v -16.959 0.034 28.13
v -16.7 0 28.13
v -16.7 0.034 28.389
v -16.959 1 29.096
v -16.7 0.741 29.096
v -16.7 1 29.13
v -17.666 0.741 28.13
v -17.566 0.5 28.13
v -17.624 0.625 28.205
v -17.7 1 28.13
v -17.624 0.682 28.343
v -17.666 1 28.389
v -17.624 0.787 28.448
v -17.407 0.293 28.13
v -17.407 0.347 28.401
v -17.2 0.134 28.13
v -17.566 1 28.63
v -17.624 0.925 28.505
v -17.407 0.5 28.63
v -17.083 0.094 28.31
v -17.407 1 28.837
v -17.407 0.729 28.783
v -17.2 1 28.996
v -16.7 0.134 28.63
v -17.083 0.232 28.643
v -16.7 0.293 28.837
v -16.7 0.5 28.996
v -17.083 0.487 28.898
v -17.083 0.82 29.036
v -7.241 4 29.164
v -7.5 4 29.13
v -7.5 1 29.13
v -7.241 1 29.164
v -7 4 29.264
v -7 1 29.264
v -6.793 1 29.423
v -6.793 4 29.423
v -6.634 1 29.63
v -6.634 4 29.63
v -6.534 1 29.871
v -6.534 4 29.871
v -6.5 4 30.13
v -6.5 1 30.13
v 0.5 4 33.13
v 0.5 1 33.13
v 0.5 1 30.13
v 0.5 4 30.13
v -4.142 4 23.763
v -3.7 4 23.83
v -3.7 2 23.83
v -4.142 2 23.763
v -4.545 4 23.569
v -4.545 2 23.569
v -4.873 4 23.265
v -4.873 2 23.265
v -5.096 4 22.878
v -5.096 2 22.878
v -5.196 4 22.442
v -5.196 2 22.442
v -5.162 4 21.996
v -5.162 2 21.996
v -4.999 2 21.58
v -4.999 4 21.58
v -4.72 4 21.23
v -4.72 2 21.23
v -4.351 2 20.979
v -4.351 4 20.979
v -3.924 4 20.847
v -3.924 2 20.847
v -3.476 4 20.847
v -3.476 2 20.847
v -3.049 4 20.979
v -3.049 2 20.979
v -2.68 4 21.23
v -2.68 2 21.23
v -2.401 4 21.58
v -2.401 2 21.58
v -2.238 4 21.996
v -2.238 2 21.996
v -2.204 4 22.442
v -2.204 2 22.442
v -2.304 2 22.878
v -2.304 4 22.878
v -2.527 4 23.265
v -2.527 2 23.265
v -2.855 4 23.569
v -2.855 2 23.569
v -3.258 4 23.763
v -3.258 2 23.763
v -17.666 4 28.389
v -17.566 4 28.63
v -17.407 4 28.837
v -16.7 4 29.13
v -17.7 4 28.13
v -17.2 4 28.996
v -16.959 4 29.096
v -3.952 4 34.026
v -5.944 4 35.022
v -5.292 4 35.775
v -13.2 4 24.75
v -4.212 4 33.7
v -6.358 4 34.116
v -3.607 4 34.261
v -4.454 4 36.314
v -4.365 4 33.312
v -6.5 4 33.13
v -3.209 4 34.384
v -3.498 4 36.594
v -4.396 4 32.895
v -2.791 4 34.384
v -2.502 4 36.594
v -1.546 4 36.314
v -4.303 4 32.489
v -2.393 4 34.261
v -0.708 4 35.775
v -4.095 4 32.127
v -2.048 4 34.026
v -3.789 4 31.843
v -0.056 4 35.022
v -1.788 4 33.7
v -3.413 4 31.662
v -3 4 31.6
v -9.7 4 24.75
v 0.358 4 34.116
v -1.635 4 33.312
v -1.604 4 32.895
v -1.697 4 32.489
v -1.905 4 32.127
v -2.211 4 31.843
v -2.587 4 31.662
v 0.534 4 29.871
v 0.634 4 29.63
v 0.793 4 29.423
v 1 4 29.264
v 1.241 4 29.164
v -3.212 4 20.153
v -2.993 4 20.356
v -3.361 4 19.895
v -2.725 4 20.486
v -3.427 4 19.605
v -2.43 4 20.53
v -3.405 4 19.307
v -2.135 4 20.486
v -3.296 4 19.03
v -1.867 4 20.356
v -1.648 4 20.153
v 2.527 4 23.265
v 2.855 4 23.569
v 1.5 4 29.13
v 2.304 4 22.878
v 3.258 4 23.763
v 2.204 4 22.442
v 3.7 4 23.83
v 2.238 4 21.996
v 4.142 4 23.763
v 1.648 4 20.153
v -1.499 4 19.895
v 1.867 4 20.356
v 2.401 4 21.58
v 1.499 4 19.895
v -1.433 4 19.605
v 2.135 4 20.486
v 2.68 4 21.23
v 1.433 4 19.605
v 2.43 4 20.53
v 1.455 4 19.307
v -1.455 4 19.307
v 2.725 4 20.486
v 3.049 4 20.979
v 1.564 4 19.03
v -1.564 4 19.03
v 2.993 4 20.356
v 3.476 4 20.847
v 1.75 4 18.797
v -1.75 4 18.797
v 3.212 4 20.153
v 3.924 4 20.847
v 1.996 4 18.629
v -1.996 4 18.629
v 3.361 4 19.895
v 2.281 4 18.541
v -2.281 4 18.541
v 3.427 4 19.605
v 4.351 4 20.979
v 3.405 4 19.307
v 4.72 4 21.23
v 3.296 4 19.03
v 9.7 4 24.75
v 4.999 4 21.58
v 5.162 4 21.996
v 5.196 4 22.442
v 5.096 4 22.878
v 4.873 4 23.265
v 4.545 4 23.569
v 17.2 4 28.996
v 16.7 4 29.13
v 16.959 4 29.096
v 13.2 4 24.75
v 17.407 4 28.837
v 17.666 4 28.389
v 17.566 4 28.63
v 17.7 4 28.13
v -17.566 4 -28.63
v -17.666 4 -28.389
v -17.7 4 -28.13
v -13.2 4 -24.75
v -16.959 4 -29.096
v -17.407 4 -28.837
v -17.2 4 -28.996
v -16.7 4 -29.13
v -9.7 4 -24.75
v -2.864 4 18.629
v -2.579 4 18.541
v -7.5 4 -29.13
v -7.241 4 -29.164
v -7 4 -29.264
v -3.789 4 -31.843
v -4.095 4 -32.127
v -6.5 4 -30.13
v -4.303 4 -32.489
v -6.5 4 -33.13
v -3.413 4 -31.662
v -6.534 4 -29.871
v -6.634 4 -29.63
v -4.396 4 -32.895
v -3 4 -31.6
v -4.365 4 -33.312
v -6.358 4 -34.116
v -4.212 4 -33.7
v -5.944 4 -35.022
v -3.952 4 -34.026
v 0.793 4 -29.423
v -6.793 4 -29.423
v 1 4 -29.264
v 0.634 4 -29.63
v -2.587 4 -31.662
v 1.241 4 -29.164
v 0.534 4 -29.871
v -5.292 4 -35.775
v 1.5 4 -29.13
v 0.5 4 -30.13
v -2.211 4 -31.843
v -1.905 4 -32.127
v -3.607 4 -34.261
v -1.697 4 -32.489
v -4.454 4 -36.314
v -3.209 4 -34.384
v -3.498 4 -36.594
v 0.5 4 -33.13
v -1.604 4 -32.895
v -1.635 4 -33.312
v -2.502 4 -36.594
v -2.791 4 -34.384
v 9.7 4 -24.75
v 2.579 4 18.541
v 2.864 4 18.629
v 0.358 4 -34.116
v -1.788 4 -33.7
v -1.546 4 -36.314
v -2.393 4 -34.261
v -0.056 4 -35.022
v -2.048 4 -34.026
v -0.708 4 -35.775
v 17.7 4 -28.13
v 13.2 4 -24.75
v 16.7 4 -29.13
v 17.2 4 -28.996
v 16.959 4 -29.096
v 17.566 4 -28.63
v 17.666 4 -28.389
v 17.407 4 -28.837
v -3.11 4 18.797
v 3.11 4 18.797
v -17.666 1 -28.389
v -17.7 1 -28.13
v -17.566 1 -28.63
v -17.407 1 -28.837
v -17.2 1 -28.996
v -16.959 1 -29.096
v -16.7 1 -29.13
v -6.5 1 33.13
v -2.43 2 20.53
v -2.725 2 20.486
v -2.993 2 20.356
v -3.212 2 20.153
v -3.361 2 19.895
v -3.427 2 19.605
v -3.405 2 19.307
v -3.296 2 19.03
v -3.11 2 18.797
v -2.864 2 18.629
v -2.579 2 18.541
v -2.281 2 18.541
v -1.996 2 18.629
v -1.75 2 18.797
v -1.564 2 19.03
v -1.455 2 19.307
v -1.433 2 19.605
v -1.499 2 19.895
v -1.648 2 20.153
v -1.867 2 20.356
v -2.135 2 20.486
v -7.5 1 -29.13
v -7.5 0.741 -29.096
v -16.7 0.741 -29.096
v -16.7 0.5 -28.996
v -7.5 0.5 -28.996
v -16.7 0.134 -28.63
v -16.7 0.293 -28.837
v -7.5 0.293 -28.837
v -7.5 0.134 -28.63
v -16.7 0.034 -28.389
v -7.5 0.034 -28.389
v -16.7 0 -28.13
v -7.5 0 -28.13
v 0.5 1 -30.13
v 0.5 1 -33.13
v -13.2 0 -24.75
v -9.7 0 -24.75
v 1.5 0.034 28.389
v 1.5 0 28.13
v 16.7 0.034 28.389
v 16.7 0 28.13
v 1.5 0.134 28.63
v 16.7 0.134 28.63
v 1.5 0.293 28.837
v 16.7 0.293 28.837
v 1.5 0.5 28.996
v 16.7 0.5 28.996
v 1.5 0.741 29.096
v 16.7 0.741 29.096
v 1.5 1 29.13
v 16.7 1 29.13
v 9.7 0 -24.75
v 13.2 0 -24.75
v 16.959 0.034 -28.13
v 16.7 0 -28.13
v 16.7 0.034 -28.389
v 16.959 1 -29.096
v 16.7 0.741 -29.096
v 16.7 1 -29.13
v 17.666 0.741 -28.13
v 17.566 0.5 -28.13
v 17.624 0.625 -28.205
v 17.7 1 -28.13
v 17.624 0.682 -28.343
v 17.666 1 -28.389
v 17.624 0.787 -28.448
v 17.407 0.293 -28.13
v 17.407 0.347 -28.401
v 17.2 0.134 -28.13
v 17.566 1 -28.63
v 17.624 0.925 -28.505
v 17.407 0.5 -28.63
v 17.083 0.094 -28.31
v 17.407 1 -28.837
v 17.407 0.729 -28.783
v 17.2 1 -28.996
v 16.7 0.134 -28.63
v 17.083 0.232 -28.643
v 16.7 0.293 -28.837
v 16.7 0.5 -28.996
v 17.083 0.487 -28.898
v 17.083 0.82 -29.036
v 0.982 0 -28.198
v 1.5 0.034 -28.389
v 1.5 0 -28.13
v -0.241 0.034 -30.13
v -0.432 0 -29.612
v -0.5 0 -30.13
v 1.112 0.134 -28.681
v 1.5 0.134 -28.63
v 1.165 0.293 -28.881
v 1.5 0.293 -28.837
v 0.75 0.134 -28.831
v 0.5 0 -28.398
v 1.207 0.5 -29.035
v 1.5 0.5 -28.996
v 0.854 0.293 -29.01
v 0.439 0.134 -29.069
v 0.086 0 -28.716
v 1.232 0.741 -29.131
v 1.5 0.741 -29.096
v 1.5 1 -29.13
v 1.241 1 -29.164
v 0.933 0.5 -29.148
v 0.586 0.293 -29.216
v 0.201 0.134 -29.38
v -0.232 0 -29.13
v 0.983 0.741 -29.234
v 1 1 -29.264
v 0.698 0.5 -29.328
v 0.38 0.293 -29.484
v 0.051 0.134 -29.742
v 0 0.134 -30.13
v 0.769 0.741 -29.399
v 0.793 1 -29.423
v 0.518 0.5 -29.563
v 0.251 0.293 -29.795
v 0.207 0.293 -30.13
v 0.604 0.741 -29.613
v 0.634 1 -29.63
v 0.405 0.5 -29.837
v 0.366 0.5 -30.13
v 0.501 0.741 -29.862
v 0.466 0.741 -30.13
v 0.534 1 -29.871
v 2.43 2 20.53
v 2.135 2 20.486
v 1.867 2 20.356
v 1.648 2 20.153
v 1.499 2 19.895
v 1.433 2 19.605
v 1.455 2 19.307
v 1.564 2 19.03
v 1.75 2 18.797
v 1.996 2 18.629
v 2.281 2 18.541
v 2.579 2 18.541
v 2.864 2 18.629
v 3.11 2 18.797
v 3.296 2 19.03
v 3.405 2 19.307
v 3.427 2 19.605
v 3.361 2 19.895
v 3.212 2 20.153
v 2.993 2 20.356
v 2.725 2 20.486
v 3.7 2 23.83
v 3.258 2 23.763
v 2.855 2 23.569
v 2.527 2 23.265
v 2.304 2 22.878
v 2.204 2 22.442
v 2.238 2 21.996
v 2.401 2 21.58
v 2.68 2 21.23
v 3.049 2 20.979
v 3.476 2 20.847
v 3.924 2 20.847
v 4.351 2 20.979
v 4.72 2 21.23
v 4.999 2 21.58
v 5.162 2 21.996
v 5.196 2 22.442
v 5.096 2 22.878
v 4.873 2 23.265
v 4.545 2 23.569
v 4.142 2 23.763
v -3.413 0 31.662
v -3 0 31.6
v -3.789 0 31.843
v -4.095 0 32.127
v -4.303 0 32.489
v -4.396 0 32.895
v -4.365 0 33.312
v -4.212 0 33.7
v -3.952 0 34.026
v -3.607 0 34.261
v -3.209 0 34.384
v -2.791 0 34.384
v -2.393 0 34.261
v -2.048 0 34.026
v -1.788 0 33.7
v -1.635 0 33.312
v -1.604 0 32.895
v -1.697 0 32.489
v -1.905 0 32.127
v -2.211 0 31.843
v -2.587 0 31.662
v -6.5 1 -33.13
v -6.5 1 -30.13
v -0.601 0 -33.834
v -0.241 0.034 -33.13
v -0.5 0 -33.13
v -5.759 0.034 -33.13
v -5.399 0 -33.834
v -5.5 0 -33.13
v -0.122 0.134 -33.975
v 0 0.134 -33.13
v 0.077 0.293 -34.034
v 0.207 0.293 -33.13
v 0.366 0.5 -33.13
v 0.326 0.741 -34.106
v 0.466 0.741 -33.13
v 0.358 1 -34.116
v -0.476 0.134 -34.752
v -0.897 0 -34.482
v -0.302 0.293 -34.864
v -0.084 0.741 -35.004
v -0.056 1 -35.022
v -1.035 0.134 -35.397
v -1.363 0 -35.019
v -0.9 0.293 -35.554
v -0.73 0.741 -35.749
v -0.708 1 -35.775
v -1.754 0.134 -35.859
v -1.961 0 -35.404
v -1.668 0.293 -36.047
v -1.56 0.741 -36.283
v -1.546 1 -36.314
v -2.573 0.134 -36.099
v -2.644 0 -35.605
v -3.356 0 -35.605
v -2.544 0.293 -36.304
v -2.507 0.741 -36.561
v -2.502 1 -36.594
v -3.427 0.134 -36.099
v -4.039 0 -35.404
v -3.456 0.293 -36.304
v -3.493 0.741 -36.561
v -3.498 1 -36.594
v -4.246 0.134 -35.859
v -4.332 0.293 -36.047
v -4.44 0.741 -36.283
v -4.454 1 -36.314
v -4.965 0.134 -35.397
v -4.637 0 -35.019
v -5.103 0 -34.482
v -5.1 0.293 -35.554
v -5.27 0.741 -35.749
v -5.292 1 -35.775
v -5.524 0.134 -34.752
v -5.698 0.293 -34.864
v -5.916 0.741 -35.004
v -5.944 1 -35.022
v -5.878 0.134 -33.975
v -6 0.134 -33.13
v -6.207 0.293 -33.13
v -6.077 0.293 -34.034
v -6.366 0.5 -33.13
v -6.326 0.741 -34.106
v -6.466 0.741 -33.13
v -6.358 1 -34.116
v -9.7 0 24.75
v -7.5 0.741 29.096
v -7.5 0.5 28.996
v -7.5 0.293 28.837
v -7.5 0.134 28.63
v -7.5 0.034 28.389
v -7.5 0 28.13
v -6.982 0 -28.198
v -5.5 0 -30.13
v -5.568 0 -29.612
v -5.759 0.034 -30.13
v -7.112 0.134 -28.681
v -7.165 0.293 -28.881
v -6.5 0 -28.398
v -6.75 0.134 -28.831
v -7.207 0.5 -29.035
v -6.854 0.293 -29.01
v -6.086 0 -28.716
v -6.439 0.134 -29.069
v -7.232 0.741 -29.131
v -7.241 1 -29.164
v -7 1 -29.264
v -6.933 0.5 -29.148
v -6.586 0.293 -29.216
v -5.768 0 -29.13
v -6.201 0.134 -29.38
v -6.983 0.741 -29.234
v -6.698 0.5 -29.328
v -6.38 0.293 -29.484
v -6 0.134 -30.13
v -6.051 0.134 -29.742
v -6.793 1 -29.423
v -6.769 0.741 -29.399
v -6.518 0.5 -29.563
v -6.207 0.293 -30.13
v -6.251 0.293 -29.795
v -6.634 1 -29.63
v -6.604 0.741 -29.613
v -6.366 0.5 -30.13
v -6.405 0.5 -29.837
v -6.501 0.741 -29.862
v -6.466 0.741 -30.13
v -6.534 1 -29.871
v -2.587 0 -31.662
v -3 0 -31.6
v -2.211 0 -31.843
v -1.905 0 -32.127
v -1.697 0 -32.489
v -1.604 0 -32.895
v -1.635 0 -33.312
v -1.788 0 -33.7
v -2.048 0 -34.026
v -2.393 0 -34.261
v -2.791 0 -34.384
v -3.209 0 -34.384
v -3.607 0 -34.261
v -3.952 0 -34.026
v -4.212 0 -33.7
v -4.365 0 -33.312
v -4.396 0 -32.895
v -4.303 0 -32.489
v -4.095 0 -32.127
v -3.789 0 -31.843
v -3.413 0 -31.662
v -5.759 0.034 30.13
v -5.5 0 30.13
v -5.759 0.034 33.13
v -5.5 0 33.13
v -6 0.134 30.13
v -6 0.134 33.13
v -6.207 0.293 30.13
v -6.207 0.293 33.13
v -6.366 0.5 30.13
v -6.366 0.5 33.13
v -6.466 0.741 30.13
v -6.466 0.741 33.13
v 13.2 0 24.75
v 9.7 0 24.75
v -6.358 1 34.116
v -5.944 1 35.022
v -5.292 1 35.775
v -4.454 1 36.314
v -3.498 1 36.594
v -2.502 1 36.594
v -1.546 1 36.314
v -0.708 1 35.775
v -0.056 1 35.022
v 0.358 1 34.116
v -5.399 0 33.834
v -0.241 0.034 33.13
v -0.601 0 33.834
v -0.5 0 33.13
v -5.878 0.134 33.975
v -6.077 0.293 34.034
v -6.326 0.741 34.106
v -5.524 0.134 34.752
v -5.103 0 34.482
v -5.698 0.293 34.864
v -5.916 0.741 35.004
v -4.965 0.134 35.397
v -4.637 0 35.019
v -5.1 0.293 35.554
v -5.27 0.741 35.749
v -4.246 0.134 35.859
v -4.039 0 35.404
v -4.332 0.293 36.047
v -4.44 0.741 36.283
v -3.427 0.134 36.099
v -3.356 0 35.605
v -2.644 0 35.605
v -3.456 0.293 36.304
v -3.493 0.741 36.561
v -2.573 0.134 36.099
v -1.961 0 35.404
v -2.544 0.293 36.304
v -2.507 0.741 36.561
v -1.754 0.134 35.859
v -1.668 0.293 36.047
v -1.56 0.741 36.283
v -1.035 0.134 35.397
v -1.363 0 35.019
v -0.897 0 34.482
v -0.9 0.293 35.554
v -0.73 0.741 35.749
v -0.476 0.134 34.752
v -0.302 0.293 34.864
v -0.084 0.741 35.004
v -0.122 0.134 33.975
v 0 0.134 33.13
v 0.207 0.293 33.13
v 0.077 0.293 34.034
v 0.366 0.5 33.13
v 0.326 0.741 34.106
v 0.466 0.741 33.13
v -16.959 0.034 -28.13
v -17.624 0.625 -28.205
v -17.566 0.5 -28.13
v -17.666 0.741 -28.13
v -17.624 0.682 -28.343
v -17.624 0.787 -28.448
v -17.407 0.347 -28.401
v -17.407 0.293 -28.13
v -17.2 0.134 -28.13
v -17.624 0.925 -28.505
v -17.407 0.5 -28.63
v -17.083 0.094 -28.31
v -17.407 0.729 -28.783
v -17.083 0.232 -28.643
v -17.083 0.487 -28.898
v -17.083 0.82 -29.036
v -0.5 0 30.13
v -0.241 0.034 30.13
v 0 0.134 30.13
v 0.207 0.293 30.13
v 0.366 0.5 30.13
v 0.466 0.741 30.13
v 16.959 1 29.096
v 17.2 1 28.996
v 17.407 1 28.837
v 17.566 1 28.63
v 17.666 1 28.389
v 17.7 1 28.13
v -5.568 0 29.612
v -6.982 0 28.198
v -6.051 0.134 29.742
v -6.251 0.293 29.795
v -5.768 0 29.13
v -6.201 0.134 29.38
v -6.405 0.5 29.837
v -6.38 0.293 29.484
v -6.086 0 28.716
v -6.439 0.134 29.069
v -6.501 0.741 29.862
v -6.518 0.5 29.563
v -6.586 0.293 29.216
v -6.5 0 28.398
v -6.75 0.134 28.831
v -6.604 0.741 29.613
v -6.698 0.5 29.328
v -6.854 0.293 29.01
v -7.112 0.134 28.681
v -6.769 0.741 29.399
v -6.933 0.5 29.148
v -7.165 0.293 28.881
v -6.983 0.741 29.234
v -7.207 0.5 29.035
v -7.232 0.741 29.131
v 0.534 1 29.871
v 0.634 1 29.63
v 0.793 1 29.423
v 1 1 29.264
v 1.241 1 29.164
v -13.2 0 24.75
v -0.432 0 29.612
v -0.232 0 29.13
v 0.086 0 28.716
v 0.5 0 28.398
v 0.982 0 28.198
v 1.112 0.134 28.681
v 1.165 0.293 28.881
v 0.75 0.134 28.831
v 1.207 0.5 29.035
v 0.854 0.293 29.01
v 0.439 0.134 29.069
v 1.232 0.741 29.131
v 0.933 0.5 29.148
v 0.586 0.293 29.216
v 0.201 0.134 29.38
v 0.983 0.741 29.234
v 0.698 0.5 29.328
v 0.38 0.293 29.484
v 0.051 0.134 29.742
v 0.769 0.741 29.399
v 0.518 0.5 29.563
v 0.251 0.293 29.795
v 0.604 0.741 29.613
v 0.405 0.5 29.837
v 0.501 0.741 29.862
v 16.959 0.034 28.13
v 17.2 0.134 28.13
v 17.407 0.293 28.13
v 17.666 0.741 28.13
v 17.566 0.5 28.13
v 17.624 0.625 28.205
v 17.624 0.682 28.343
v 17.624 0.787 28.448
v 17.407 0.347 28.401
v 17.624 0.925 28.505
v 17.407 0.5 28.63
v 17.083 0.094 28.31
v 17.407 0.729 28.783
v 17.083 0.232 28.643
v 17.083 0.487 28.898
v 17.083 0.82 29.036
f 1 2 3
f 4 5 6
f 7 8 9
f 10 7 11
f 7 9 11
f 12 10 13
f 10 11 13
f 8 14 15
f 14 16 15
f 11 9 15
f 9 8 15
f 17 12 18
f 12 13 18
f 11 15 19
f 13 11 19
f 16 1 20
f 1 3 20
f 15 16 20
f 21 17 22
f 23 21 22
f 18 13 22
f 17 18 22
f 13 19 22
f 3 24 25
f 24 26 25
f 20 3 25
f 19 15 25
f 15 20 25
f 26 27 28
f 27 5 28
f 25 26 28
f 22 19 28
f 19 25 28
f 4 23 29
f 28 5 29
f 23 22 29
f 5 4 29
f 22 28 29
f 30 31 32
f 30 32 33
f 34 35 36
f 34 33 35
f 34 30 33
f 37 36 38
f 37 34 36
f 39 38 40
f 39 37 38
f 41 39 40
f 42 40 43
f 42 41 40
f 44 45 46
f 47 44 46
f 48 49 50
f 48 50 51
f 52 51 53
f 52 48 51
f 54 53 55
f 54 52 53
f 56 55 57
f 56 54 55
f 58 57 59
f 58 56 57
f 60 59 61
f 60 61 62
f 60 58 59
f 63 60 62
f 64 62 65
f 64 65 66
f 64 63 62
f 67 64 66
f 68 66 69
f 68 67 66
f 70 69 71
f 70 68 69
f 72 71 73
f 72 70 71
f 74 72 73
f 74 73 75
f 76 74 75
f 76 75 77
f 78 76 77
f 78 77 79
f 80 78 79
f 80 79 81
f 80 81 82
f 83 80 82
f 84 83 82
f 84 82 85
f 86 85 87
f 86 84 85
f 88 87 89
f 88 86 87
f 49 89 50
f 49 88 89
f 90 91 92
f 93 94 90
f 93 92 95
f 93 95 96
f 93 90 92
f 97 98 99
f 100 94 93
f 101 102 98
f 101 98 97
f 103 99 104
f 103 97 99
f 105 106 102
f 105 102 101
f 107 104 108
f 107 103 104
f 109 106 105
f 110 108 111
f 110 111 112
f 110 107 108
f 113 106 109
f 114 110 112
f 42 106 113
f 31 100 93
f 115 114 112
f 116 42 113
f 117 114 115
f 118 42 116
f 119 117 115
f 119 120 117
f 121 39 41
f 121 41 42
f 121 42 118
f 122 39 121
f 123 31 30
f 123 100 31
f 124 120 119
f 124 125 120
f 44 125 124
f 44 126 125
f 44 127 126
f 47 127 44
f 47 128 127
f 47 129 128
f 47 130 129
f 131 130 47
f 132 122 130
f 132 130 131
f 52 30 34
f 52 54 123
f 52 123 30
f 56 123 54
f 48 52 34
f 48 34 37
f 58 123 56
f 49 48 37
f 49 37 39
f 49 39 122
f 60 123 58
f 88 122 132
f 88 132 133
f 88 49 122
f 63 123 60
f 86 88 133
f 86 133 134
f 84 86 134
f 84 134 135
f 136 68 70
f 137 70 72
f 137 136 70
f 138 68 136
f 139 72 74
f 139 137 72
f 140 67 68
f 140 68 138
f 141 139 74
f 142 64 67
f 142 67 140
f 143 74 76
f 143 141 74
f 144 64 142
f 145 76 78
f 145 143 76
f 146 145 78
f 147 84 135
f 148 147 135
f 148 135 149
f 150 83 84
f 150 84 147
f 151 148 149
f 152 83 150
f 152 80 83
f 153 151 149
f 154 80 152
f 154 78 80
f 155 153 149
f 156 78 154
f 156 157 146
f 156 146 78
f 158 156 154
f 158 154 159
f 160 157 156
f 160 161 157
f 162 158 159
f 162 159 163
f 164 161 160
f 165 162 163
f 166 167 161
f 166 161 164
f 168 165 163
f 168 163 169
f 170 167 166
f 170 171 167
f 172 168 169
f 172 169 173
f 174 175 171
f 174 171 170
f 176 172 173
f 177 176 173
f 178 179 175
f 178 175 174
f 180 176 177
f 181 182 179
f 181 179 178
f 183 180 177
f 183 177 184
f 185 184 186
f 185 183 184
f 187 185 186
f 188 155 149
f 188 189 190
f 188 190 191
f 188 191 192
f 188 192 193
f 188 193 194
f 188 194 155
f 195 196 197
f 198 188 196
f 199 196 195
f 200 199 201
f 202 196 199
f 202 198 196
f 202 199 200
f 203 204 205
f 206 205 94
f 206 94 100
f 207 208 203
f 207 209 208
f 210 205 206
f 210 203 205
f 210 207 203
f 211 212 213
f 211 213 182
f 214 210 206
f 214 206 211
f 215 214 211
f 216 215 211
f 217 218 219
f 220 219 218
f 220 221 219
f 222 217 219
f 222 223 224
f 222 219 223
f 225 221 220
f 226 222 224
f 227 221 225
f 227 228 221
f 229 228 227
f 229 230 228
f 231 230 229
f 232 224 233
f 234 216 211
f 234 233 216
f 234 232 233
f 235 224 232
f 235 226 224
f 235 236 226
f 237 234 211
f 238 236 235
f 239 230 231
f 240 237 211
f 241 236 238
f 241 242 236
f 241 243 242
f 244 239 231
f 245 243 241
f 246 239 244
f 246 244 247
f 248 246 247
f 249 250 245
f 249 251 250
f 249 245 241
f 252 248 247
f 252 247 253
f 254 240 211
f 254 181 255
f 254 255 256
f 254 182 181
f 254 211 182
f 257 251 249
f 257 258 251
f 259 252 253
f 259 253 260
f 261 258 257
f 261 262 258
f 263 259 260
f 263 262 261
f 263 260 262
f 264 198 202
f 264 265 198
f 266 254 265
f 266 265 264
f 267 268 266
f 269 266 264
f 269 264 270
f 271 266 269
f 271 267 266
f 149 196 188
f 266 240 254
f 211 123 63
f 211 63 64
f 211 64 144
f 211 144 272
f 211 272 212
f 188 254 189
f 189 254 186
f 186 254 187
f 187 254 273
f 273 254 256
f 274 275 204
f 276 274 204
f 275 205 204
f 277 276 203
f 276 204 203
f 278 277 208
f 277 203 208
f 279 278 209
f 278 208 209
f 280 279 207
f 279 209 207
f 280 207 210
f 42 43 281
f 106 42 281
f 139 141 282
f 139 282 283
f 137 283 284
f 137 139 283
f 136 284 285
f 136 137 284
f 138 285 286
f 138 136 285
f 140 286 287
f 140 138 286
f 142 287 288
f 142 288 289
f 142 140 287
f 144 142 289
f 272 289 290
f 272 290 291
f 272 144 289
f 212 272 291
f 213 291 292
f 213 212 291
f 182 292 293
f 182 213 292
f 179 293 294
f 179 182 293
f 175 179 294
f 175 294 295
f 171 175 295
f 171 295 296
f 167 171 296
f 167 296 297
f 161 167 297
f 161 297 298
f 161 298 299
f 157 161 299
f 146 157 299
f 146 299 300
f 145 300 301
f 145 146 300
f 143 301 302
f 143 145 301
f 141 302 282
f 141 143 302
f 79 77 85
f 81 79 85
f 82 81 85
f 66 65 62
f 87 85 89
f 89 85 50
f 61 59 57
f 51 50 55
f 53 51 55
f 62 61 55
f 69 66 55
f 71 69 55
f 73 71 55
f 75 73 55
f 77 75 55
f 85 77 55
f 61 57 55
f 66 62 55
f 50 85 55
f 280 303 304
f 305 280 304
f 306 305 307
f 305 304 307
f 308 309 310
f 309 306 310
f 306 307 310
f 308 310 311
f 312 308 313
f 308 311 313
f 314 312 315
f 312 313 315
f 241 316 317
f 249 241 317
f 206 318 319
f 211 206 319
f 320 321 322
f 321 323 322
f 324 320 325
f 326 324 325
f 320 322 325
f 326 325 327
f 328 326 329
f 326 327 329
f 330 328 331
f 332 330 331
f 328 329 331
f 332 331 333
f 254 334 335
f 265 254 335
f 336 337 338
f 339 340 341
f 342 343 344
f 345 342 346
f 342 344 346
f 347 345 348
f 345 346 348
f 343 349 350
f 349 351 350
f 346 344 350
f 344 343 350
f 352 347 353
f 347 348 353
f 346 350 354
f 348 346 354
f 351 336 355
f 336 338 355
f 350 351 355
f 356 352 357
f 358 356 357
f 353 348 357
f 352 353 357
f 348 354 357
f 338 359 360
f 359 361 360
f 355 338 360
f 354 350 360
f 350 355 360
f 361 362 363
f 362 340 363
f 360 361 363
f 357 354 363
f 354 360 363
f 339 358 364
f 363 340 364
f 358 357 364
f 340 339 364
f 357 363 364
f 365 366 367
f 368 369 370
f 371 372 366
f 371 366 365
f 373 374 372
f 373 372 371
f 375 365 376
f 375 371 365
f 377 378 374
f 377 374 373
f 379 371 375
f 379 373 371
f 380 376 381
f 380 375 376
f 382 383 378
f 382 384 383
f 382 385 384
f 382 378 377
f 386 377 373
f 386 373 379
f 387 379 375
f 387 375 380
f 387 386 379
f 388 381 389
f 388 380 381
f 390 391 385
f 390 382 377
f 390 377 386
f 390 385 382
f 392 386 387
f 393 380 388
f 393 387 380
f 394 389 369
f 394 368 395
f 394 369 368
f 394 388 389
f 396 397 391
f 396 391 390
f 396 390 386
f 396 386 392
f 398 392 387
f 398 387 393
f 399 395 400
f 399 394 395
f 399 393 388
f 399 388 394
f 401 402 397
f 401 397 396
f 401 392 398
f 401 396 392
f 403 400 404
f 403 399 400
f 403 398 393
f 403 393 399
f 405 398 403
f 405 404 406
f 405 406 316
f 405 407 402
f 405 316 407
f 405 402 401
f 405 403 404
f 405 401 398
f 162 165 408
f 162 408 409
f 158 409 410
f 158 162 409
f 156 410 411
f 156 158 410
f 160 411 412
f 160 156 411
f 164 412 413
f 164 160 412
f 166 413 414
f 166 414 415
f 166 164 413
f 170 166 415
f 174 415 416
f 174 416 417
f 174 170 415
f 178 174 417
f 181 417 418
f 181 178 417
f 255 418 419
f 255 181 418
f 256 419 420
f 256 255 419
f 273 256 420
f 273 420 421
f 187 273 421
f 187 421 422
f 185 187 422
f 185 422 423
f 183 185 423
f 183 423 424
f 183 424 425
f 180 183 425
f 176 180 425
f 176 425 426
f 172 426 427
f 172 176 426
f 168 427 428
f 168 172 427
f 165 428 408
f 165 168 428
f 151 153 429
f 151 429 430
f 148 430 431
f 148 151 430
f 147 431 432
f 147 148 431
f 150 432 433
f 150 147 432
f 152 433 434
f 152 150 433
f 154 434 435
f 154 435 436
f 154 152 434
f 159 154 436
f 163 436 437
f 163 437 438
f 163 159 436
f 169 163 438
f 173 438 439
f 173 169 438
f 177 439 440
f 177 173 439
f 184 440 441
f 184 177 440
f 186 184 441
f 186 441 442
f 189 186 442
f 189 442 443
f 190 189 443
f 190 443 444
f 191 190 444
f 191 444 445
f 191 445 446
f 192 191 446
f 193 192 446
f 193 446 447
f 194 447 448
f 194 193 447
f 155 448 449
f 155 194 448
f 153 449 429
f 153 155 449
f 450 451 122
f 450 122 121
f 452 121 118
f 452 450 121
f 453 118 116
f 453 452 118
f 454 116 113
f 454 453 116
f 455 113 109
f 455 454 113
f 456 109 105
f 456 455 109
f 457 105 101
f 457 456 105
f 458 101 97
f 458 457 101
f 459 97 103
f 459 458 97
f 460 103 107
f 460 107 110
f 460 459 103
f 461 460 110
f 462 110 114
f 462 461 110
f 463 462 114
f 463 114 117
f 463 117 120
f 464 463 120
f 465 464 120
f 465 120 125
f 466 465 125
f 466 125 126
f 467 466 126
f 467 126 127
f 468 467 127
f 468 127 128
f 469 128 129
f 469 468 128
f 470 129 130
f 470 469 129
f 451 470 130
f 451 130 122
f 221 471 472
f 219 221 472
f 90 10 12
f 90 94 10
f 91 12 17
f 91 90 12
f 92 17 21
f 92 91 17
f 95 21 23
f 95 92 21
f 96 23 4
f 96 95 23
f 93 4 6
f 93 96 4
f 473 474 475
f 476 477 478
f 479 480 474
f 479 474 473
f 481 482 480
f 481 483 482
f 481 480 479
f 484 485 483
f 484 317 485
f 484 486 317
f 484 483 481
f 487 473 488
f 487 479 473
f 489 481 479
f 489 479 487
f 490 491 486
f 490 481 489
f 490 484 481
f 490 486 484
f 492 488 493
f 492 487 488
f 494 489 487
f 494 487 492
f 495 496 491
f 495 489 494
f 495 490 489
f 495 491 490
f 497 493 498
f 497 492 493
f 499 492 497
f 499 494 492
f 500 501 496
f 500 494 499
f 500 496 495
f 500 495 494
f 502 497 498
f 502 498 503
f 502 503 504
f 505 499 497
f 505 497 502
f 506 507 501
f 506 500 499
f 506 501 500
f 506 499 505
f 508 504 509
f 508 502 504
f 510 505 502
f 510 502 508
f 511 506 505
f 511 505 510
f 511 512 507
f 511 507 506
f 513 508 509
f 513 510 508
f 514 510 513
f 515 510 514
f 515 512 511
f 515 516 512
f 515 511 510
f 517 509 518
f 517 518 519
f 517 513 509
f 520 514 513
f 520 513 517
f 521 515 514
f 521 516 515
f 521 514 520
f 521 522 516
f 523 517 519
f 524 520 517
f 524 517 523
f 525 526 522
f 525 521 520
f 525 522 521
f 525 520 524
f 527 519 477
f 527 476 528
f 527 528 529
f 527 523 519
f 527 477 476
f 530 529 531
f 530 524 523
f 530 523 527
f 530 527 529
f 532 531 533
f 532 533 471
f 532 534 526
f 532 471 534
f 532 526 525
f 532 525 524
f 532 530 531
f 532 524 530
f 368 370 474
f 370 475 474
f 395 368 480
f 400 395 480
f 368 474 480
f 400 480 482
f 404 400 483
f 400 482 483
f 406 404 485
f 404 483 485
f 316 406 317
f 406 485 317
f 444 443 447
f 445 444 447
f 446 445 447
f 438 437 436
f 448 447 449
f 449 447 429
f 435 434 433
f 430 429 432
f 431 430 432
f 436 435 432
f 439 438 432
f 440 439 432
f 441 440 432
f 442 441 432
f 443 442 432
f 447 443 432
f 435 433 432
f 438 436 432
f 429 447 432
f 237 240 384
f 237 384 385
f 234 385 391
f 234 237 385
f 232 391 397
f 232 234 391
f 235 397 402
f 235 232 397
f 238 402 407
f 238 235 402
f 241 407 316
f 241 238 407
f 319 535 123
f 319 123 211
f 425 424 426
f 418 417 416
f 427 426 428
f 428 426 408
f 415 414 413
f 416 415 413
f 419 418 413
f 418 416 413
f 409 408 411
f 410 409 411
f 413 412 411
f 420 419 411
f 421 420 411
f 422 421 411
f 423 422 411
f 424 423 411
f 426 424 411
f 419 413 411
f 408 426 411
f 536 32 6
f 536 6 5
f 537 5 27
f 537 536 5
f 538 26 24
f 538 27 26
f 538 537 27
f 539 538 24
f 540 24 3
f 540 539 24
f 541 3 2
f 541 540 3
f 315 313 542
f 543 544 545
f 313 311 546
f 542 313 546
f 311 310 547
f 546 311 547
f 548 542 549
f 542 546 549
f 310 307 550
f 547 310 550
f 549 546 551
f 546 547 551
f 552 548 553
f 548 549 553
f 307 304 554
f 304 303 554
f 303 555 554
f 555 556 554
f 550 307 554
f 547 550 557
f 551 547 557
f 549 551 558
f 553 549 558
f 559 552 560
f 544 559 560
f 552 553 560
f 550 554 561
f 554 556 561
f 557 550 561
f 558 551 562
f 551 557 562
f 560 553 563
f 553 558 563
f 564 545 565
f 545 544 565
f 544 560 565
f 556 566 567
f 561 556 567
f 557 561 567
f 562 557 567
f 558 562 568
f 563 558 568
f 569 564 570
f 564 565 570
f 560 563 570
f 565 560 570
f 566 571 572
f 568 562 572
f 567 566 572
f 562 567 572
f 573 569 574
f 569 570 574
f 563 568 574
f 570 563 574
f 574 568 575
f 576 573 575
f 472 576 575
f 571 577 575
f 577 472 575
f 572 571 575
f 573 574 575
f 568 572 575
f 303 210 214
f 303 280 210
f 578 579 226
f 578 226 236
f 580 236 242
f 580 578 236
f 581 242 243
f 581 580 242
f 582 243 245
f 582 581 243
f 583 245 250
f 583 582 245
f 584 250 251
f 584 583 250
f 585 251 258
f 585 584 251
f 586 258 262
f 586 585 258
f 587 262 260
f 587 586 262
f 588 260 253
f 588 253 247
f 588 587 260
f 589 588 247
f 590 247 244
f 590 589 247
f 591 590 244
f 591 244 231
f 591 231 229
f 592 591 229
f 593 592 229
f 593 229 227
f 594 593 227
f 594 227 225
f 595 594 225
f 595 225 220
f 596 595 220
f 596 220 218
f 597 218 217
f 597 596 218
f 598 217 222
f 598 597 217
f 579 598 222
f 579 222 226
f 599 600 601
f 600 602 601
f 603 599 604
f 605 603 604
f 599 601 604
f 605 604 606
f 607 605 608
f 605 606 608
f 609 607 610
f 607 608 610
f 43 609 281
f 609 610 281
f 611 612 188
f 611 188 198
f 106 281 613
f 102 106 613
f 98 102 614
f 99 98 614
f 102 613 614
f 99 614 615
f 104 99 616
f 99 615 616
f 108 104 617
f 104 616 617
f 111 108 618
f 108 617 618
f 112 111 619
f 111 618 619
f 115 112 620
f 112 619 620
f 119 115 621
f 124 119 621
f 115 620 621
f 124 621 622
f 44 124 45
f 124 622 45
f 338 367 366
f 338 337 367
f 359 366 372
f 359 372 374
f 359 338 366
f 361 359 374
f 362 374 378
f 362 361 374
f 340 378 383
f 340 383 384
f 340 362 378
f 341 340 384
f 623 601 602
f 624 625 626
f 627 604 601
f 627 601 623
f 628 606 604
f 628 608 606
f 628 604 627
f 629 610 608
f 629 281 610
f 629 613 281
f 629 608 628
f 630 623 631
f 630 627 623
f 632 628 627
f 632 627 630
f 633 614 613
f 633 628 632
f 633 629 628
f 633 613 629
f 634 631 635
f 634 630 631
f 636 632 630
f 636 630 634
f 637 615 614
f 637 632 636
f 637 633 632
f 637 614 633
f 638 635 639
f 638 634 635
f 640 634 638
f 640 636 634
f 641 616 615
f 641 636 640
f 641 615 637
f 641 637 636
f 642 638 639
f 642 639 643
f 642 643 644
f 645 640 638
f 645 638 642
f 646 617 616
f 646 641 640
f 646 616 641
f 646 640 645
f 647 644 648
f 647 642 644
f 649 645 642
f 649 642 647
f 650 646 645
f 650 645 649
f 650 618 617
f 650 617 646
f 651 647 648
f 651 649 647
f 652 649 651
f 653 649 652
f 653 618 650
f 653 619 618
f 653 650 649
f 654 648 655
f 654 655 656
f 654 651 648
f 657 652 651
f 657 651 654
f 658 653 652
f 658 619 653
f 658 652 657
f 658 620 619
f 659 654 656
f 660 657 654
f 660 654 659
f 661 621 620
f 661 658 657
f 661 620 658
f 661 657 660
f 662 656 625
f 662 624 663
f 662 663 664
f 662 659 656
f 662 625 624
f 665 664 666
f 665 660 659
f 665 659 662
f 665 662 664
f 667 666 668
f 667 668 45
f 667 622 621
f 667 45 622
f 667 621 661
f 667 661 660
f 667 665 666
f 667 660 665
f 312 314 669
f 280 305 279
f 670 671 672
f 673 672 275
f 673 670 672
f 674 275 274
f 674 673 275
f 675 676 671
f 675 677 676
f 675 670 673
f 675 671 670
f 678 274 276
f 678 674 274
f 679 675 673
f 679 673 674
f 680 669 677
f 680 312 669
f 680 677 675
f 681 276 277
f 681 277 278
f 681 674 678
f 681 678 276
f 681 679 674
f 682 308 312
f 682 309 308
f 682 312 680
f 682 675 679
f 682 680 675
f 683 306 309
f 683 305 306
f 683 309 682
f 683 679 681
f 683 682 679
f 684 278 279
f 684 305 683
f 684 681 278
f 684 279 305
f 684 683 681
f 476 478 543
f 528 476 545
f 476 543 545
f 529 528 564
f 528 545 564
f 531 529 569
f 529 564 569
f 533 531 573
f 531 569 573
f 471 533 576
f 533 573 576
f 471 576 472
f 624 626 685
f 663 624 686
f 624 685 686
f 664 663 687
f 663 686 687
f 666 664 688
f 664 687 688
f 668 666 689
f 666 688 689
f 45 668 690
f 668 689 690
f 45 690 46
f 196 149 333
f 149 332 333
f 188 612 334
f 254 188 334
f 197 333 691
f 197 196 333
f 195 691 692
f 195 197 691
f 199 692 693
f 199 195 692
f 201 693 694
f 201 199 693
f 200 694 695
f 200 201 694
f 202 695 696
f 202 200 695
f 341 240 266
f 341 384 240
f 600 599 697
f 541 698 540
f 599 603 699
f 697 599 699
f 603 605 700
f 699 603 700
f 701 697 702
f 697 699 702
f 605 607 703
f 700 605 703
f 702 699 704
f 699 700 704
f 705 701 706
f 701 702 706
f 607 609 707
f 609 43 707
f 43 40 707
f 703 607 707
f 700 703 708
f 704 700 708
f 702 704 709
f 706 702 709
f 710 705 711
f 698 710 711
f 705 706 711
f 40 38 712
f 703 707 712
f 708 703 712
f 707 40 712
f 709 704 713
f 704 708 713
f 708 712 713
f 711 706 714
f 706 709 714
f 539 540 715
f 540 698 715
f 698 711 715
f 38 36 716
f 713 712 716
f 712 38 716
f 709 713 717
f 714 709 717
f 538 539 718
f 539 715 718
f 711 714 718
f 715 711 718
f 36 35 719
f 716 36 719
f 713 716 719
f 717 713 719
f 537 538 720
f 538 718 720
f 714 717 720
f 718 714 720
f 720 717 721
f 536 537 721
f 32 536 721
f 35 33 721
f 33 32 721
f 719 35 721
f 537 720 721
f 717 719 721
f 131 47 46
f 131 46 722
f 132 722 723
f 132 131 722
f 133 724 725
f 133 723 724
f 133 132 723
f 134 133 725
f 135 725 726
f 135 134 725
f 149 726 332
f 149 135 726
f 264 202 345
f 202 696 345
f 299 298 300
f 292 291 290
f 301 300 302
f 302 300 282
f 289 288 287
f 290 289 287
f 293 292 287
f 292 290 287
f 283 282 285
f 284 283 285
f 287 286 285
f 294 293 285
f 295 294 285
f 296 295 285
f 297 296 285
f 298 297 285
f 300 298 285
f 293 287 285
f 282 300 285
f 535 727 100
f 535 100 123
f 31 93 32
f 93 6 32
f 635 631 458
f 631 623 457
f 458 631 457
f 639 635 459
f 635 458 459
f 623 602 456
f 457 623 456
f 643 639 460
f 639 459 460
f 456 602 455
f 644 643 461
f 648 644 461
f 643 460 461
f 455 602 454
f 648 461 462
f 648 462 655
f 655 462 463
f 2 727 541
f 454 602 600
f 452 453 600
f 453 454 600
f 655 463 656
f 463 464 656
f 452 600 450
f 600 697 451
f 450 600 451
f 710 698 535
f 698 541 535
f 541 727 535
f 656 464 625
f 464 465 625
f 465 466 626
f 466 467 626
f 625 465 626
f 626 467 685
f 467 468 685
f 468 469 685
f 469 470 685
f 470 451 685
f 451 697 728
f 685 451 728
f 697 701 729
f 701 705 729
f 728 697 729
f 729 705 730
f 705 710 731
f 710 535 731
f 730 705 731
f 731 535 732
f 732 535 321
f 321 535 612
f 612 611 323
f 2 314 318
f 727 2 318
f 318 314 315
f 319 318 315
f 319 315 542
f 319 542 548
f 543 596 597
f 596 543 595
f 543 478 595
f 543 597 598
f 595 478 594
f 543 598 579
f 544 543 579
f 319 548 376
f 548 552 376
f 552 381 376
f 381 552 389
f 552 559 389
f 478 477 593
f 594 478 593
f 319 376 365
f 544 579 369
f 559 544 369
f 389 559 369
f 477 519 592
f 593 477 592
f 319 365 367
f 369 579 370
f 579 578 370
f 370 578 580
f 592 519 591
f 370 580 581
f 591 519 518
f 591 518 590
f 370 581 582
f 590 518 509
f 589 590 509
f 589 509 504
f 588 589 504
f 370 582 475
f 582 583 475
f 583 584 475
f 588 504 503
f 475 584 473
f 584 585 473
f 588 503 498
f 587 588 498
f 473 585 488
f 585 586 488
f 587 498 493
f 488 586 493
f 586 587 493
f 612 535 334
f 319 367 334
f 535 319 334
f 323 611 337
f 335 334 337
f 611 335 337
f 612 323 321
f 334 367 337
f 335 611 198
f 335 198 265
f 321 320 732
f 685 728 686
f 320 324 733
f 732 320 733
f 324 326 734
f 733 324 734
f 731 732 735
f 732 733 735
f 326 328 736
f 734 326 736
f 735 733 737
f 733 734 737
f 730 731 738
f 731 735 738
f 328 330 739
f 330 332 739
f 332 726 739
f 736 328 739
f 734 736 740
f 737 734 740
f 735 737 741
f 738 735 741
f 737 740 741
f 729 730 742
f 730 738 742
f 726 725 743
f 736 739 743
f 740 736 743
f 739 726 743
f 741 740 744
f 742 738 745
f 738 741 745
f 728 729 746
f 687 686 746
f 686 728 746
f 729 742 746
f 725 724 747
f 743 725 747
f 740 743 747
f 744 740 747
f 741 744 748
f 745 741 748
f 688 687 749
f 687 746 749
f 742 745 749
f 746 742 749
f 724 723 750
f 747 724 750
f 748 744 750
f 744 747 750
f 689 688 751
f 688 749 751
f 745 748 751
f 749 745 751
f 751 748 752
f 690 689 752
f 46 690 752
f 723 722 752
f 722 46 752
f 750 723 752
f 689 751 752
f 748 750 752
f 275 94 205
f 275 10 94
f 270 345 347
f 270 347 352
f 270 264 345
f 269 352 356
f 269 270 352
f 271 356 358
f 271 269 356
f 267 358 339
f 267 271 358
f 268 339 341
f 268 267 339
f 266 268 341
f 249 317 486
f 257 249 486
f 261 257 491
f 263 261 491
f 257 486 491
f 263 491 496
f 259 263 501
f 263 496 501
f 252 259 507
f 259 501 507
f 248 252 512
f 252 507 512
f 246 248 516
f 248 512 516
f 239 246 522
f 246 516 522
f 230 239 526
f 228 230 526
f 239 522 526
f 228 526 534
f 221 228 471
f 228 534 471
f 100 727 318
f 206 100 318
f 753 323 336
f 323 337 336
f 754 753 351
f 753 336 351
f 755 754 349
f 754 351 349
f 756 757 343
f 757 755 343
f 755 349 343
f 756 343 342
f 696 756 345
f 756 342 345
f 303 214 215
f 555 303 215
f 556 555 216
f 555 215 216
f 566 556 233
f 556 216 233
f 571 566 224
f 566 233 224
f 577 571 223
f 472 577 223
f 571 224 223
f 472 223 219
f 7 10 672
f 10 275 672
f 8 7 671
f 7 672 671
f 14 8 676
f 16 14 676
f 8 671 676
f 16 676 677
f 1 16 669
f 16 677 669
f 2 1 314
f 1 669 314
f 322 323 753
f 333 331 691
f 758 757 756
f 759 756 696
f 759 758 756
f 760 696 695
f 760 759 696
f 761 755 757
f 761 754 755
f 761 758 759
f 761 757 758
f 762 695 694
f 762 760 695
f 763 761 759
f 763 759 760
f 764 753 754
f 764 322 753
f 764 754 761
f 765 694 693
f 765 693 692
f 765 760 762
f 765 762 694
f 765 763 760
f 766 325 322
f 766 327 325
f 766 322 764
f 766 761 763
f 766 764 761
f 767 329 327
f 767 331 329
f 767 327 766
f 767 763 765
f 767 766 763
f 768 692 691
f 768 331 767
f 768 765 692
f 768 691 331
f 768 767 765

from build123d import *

# Parameters (mm, degrees)
SKETCH1_W            = 35.4
SKETCH1_H            = 58.26
SKETCH1_W_2          = 3.5
SKETCH1_H_2          = 49.5
BASE_DEPTH           = 4
SKETCH2_R            = 1.4
MOUNTING_ENDS_DEPTH  = 4
TOP_START            = -4
SKETCH3_R            = 1.5
SKETCH3_R_2          = 1
TOP_CUTOUTS_DEPTH    = 2
F_1MM_EDGE_FILLETS_R = 1


with BuildPart() as part:
    # Sketch1 → Base (new body)
    with BuildSketch(Plane(origin=(0, 0, 0), x_dir=(1, 0, 0), z_dir=(0, 1, 0))):
        Rectangle(SKETCH1_W, SKETCH1_H)
        with Locations((-11.45, 0)):
            Rectangle(SKETCH1_W_2, SKETCH1_H_2, mode=Mode.SUBTRACT)
        with Locations((11.45, 0)):
            Rectangle(SKETCH1_W_2, SKETCH1_H_2, mode=Mode.SUBTRACT)
    extrude(amount=BASE_DEPTH)

    # Sketch2 → Mounting Ends (add)
    # profile 1 of 2: a face of its own
    with BuildSketch(Plane(origin=(0, 0, 0), x_dir=(1, 0, 0), z_dir=(0, 1, 0))):
        with BuildLine():
            Line((-6.5, 29.13), (0.5, 29.13))
            Line((0.5, 29.13), (0.5, 33.13))
            ThreePointArc((0.5, 33.13), (-3, 36.63), (-6.5, 33.13))
            Line((-6.5, 33.13), (-6.5, 29.13))
        make_face()
        with Locations(Location((-3, 33, 0), (0, 0, 270))):
            Circle(SKETCH2_R, mode=Mode.SUBTRACT)
    # profile 2 of 2: a face of its own
    with BuildSketch(Plane(origin=(0, 0, 0), x_dir=(1, 0, 0), z_dir=(0, 1, 0))):
        with BuildLine():
            Line((-6.5, -29.13), (-6.5, -33.13))
            ThreePointArc((-6.5, -33.13), (-3, -36.63), (0.5, -33.13))
            Line((0.5, -33.13), (0.5, -29.13))
            Line((0.5, -29.13), (-6.5, -29.13))
        make_face()
        with Locations(Location((-3, -33, 0), (0, 0, 90))):
            Circle(SKETCH2_R, mode=Mode.SUBTRACT)
    extrude(amount=MOUNTING_ENDS_DEPTH)

    # Sketch3 → Top Cutouts (cut)
    with BuildSketch(Plane.XZ.offset(TOP_START)):
        with Locations(Location((-3.7, 22.33, 0), (0, 0, 90))):
            Circle(SKETCH3_R)
        with Locations(Location((-2.43, 19.53, 0), (0, 0, 90))):
            Circle(SKETCH3_R_2)
        with Locations(Location((2.43, 19.53, 0), (0, 0, 90))):
            Circle(SKETCH3_R_2)
        with Locations(Location((3.7, 22.33, 0), (0, 0, 90))):
            Circle(SKETCH3_R)
    extrude(amount=TOP_CUTOUTS_DEPTH, mode=Mode.SUBTRACT)

    # 1mm Edge Fillets
    f_1mm_edge_fillets_edges = [part.edges().sort_by_distance(p)[0] for p in [
        (-12.1, 0, -29.13),
        (-3, 0, -36.63),
        (0.5, 2, -29.13),
        (0.5, 0, -31.13),
        (-6.5, 2, -29.13),
        (-6.5, 0, -31.13),
        (-12.1, 0, 29.13),
        (-17.7, 0, 0),
        (9.1, 0, 29.13),
        (9.1, 0, -29.13),
        (-6.5, 2, 29.13),
        (-6.5, 0, 31.13),
        (0.5, 2, 29.13),
        (0.5, 0, 31.13),
        (-3, 0, 36.63),
        (17.7, 0, 0),
        (17.7, 2, 29.13),
        (-17.7, 2, 29.13),
        (-17.7, 2, -29.13),
        (17.7, 2, -29.13),
    ]]
    fillet(f_1mm_edge_fillets_edges, radius=F_1MM_EDGE_FILLETS_R)


solid = part.part
